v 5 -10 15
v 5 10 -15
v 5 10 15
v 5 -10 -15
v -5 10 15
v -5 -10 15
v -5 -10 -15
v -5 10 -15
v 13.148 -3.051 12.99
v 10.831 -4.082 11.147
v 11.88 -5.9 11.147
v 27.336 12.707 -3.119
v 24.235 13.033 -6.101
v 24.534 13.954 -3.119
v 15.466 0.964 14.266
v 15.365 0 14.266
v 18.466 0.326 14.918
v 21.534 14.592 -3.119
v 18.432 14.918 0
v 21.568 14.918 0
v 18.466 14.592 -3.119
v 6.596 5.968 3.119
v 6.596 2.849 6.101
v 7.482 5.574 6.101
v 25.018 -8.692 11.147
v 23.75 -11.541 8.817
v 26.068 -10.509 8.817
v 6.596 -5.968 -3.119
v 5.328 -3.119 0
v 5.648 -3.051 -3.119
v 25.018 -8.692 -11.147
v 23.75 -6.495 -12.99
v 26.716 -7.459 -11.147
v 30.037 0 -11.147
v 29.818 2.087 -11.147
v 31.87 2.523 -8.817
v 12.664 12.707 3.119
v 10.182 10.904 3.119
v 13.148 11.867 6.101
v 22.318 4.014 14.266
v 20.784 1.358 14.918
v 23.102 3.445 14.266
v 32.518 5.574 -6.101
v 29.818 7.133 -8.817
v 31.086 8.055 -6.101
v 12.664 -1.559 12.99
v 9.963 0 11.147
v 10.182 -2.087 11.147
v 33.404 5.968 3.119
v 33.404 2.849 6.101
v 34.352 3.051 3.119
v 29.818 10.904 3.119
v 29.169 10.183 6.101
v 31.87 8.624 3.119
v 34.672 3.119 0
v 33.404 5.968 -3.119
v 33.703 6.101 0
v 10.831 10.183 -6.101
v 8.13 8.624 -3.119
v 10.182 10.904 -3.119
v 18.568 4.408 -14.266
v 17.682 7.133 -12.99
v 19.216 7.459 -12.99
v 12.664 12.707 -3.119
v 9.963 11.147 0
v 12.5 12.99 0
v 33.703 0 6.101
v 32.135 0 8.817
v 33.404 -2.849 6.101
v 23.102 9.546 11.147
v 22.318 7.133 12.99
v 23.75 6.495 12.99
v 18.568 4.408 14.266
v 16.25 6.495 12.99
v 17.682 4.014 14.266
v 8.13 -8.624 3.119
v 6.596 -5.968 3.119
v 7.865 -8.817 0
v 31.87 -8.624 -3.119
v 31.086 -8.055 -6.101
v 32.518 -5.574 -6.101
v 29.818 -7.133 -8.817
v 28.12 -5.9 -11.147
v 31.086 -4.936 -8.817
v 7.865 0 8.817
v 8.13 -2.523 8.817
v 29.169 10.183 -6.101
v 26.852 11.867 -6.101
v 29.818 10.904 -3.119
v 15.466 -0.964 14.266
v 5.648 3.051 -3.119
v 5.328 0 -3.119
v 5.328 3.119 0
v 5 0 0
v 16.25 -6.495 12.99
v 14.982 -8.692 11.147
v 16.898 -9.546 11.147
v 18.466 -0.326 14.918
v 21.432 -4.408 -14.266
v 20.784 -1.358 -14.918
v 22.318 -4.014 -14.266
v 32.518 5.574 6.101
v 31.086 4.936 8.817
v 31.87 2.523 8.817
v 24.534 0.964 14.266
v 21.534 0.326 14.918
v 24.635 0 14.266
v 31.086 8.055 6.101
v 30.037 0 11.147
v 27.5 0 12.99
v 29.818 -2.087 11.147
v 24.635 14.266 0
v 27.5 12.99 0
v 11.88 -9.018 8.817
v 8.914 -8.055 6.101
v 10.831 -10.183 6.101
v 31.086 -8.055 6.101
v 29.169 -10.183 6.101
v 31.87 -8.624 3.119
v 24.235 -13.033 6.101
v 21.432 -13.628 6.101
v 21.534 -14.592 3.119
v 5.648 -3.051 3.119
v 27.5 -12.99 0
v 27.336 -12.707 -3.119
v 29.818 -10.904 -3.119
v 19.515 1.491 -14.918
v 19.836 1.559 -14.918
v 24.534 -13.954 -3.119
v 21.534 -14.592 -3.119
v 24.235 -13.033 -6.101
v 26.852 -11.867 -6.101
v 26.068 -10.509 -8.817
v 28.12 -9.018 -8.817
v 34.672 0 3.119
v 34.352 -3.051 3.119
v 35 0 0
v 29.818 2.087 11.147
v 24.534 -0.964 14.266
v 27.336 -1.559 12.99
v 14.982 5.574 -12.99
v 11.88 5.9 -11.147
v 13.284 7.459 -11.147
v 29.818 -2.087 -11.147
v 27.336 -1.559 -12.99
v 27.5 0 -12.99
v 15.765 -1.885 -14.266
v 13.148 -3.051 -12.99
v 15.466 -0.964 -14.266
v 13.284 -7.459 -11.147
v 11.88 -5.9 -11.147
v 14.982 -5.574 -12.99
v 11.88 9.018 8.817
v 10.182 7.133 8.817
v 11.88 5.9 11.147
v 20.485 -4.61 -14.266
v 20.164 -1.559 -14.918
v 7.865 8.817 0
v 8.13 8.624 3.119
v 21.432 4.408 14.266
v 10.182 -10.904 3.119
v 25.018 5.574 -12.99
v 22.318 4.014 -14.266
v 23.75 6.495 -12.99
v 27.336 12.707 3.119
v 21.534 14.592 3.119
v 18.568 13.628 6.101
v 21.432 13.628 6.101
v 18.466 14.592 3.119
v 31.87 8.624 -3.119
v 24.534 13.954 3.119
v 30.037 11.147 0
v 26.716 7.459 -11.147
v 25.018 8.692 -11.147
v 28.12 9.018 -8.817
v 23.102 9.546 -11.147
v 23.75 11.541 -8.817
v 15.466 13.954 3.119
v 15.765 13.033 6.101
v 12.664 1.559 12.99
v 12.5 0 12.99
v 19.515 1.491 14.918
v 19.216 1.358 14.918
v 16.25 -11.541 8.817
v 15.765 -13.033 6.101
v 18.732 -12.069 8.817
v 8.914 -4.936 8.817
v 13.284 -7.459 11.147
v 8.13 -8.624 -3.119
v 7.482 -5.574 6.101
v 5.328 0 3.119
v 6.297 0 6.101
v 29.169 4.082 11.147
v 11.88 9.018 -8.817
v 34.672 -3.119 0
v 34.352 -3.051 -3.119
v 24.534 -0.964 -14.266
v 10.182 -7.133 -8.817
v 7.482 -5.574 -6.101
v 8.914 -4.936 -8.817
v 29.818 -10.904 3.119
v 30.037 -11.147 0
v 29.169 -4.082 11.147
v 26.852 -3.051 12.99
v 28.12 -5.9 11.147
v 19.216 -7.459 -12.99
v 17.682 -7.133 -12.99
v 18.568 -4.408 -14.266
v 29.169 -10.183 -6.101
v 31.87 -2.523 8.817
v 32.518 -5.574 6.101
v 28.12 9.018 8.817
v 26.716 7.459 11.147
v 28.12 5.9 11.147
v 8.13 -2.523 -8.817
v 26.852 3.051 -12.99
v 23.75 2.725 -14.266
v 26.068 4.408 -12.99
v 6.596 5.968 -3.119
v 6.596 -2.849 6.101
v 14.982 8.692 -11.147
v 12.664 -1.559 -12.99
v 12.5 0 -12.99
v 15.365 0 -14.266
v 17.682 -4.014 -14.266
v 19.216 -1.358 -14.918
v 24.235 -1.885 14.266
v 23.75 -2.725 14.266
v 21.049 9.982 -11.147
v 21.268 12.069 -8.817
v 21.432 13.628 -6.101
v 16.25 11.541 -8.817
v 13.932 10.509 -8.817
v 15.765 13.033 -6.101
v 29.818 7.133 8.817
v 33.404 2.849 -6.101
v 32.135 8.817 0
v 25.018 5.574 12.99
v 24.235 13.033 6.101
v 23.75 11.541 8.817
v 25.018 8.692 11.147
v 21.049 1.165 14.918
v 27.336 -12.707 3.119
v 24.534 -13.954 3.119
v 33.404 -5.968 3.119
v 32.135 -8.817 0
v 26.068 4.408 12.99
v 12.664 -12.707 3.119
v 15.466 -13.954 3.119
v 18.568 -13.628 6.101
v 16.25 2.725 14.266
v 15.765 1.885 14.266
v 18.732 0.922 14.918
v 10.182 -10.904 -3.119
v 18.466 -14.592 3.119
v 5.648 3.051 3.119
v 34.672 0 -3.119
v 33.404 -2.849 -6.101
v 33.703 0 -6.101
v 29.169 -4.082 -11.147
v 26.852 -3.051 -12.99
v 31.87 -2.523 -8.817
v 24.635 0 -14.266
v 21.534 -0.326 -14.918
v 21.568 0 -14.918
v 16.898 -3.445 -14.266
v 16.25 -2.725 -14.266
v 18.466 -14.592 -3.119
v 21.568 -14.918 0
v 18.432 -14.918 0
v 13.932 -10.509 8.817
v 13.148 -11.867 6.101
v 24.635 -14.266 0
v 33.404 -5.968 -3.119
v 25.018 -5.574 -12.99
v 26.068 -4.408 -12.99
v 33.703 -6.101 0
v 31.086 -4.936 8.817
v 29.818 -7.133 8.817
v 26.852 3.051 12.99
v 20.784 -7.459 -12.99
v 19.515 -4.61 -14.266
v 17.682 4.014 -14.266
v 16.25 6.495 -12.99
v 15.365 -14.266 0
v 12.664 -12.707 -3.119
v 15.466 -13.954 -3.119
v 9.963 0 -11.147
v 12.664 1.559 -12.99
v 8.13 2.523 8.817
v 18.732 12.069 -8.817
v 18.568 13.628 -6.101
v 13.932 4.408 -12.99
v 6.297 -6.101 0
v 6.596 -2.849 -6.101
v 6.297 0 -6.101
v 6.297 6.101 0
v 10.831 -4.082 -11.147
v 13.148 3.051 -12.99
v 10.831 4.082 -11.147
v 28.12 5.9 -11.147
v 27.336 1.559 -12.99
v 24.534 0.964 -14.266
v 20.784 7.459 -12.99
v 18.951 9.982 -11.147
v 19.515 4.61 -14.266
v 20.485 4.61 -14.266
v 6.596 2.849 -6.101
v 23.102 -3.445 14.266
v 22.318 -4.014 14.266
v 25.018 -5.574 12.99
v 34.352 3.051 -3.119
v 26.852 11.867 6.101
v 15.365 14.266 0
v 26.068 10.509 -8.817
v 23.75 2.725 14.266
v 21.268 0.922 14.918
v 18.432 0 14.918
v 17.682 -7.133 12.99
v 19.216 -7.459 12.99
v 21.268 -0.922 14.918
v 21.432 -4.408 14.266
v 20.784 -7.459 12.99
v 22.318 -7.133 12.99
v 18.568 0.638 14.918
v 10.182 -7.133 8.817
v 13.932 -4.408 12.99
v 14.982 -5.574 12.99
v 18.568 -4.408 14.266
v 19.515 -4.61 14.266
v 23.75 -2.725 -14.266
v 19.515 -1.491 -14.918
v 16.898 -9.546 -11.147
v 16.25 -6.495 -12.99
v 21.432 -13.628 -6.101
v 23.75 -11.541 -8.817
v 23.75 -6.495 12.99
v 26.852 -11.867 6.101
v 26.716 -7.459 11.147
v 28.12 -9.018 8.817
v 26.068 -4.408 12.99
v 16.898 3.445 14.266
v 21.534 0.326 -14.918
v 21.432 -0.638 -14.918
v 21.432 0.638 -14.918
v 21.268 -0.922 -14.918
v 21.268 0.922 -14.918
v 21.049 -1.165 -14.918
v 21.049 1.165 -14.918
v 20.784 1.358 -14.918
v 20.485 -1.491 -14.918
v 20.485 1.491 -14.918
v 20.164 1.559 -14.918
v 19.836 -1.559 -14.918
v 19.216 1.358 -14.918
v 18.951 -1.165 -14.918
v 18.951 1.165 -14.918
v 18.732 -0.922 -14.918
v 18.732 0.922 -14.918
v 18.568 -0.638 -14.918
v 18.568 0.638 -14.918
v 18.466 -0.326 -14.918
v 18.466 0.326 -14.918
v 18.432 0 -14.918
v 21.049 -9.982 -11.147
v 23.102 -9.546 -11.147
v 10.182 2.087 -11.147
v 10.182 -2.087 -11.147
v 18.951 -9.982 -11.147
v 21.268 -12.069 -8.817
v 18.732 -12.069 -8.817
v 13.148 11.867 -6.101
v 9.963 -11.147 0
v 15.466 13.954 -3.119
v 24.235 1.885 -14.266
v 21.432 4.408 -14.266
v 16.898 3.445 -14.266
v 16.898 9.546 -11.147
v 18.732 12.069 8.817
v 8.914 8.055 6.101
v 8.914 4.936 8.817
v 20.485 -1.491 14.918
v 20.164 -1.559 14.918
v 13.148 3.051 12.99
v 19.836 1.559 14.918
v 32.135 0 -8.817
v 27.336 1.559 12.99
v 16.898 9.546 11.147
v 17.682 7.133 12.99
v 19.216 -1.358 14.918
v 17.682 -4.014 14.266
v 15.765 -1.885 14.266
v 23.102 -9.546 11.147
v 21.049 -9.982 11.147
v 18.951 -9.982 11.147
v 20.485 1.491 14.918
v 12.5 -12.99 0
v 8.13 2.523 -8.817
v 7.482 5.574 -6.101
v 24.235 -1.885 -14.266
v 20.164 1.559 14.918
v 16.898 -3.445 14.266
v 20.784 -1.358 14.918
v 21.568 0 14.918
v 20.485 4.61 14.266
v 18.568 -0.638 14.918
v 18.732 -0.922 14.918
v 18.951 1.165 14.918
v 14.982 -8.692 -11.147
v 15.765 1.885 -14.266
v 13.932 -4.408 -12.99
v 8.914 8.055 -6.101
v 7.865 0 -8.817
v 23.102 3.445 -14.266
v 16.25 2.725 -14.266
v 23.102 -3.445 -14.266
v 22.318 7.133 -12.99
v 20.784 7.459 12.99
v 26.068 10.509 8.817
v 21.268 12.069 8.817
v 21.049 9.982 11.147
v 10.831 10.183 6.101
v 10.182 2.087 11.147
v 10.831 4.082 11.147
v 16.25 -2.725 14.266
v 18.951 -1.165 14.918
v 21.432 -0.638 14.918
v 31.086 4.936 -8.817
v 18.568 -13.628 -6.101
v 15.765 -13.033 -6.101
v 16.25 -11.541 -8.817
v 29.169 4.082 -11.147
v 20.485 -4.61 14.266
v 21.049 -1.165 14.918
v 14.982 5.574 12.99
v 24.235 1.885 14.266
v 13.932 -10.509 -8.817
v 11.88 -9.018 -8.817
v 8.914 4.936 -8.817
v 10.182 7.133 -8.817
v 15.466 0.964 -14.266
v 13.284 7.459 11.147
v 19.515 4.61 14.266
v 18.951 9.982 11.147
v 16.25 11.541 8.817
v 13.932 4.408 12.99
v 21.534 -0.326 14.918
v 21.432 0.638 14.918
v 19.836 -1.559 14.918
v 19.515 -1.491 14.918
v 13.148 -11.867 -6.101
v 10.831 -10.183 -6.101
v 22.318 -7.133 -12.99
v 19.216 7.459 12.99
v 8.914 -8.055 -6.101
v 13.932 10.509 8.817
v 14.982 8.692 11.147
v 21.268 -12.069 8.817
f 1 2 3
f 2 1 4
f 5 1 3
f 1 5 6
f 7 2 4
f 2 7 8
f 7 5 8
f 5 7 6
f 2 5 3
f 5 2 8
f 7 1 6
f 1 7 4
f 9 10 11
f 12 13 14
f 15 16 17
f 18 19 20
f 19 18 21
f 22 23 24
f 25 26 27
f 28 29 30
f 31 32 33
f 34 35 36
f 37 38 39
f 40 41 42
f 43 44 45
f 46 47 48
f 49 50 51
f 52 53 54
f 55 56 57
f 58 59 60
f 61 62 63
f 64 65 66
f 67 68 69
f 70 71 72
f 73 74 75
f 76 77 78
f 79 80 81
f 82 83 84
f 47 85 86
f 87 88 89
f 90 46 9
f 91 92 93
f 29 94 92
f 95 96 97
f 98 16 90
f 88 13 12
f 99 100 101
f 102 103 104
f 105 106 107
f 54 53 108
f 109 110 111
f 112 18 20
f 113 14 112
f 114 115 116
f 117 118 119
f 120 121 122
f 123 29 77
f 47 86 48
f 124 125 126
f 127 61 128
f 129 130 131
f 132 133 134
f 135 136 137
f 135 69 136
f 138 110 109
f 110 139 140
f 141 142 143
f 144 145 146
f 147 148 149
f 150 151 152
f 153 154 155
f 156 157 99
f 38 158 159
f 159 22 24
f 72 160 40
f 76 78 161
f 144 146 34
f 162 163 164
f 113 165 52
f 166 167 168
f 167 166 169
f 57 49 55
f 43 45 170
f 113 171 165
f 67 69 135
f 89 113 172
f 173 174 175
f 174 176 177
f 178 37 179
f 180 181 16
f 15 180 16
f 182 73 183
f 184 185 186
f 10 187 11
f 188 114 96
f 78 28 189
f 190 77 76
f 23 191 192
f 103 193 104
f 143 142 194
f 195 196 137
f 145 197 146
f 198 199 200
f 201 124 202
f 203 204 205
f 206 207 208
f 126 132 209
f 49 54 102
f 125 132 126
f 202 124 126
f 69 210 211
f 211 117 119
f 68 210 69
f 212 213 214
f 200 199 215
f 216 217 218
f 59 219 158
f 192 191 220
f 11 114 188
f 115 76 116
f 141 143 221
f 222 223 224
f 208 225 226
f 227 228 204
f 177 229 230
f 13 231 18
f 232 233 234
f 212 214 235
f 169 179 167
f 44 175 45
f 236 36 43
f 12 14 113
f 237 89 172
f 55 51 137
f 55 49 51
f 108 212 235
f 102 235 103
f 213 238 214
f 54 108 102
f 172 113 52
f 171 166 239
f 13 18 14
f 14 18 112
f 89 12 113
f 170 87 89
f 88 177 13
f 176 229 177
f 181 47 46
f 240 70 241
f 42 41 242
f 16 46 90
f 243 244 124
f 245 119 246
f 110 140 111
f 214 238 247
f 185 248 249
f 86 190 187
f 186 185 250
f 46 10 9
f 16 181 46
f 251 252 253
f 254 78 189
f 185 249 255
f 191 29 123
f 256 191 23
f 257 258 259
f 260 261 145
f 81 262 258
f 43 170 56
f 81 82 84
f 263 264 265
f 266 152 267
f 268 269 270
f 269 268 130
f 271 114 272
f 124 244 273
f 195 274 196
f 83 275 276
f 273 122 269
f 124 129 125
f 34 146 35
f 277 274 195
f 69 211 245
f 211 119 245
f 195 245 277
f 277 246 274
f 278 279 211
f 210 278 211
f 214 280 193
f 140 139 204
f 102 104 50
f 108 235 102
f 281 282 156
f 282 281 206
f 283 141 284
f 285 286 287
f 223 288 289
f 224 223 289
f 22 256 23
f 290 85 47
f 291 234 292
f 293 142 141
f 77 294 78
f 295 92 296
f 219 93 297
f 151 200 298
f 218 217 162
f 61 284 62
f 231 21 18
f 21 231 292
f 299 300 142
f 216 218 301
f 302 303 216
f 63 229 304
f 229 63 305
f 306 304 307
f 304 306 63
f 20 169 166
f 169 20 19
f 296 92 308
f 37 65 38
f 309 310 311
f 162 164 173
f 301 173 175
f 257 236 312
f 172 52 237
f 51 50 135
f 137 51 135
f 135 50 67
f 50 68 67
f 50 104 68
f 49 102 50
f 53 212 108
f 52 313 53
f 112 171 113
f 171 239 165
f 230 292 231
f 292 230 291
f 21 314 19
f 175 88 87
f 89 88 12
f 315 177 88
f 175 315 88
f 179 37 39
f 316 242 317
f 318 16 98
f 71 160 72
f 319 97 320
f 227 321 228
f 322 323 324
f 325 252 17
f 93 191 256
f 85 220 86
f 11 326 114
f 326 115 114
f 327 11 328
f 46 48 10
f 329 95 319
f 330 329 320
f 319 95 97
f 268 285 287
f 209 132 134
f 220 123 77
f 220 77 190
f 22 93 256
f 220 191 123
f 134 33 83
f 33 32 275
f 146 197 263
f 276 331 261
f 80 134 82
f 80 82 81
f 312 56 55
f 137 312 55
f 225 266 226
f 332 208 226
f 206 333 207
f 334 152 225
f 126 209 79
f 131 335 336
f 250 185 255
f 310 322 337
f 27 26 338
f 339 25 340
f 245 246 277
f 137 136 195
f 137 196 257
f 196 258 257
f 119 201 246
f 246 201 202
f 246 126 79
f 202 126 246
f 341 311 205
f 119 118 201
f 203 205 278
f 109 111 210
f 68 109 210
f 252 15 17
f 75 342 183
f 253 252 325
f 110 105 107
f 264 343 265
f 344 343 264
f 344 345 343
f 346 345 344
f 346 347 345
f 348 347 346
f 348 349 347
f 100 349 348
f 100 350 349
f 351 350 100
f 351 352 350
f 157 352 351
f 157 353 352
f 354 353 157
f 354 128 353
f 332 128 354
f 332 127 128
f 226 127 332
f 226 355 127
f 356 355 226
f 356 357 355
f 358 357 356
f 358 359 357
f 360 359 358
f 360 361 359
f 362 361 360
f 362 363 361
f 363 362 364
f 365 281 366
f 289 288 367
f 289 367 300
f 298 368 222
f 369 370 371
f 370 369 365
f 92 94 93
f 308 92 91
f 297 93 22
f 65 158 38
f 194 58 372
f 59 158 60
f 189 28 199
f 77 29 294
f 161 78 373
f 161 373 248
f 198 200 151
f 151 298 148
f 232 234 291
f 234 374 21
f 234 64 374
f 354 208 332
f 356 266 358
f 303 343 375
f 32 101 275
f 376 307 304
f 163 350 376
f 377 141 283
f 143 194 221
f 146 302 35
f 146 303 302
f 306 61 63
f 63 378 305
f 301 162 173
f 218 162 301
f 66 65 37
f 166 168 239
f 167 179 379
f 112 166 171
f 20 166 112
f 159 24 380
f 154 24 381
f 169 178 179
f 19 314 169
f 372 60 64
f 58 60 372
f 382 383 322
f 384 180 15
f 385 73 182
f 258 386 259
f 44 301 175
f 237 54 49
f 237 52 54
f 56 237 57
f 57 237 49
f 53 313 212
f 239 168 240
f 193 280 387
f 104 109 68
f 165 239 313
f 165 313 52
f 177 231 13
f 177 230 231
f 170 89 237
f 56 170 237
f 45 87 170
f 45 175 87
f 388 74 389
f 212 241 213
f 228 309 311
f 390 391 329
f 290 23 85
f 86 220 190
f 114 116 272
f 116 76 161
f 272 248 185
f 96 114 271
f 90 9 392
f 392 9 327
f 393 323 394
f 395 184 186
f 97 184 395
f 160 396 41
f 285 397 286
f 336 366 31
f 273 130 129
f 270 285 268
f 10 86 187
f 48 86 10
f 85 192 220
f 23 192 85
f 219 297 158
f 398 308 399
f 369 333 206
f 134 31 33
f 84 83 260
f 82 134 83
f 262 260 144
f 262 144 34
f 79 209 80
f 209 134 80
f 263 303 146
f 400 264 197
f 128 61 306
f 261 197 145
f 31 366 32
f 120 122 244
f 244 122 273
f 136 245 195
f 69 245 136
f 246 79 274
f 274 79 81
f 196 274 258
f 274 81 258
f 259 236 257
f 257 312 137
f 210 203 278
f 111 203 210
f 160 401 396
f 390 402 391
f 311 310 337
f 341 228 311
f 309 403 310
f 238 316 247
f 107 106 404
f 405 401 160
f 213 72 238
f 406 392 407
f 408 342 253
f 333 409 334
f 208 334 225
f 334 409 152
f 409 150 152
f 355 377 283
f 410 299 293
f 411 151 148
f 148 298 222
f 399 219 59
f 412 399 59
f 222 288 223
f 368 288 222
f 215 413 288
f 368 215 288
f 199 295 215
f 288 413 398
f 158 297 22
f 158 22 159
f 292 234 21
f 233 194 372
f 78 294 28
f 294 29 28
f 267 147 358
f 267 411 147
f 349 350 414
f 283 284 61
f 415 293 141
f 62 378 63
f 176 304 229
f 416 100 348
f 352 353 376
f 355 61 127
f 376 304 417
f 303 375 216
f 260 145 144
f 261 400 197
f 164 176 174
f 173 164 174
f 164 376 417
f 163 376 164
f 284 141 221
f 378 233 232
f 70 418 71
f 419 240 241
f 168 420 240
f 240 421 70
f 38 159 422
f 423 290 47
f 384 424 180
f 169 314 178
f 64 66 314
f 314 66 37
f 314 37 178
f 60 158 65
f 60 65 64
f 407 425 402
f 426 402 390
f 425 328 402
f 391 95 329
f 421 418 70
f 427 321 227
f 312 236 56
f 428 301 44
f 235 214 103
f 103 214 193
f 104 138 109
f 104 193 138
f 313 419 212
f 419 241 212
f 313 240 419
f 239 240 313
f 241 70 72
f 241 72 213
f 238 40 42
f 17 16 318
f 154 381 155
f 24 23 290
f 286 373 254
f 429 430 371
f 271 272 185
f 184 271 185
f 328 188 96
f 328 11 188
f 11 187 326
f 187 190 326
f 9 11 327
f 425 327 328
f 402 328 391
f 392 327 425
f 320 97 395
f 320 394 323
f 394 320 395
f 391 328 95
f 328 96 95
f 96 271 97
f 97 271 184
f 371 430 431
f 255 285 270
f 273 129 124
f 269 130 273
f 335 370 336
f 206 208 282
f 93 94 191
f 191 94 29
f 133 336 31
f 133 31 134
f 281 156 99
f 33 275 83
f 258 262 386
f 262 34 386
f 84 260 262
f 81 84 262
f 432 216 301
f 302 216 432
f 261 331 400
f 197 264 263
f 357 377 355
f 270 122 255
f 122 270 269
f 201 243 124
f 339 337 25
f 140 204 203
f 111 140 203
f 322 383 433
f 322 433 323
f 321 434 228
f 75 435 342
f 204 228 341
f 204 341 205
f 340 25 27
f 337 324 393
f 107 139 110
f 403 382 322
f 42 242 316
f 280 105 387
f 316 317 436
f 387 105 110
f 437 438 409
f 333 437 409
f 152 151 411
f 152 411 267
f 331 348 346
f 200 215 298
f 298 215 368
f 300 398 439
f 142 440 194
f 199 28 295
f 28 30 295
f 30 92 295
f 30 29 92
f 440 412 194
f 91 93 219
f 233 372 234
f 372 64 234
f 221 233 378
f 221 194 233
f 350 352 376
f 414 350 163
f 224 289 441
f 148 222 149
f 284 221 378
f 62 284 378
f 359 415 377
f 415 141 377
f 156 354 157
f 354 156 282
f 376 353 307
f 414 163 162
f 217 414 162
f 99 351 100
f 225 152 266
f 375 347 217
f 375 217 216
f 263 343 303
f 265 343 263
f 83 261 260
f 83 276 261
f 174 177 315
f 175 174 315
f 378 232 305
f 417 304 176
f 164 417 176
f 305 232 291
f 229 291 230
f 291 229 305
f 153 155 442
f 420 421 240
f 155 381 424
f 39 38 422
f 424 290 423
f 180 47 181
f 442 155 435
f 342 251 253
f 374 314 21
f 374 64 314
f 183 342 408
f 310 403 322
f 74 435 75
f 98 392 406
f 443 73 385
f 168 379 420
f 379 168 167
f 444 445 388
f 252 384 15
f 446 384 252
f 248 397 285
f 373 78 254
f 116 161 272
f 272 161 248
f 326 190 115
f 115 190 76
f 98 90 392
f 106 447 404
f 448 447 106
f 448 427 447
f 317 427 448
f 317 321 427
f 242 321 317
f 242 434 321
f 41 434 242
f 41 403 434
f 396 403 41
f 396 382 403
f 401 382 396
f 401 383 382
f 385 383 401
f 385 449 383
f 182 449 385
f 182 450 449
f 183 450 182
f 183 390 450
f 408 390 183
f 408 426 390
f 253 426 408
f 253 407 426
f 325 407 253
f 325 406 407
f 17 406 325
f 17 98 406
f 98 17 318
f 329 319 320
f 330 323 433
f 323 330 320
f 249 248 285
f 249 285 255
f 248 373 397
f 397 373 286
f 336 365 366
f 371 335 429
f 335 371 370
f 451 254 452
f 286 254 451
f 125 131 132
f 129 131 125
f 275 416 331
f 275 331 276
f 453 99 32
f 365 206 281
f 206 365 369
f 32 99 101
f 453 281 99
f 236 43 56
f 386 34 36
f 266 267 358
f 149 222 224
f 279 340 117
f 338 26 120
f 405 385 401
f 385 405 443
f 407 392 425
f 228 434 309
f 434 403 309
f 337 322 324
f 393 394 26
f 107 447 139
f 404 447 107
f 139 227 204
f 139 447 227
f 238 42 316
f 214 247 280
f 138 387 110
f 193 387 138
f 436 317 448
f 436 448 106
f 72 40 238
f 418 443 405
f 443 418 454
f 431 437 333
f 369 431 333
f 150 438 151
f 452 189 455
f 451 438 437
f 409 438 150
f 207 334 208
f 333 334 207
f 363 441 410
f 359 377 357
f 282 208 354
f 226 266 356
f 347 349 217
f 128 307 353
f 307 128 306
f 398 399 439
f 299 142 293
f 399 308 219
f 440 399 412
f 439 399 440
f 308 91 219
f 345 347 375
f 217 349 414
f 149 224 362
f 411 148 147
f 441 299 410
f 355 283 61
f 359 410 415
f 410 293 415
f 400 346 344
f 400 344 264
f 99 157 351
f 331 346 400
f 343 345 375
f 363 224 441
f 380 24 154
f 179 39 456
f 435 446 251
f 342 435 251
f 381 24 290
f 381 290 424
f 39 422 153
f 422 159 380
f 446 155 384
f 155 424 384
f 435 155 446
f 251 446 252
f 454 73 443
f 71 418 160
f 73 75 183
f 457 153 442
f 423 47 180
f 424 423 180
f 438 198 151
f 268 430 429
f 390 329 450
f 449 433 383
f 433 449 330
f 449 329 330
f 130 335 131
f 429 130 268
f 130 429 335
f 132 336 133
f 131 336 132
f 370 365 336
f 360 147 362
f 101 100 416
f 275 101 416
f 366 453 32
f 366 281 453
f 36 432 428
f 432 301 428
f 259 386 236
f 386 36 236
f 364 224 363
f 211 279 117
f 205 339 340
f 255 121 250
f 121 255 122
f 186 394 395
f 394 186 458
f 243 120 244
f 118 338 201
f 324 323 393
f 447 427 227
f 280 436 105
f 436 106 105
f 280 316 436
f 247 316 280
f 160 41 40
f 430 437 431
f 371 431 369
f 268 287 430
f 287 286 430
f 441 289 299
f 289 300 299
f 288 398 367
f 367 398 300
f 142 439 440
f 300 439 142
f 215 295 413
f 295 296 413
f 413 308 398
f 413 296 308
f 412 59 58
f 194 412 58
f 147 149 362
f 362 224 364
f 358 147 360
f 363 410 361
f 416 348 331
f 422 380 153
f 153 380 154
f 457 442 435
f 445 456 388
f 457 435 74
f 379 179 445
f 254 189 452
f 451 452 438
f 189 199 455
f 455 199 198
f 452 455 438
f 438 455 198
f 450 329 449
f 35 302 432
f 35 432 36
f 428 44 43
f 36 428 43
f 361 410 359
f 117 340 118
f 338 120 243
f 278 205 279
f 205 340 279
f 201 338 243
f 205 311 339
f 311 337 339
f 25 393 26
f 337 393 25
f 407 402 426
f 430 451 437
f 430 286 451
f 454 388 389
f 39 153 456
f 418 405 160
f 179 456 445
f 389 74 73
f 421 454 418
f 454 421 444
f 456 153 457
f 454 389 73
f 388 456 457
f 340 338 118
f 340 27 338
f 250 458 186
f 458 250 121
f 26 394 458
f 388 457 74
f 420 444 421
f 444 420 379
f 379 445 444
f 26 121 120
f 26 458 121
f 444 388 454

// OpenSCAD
// OpenSCAD Script
cube([10, 20, 30], center=true);
translate([20, 0, 0]) sphere(r=15);
